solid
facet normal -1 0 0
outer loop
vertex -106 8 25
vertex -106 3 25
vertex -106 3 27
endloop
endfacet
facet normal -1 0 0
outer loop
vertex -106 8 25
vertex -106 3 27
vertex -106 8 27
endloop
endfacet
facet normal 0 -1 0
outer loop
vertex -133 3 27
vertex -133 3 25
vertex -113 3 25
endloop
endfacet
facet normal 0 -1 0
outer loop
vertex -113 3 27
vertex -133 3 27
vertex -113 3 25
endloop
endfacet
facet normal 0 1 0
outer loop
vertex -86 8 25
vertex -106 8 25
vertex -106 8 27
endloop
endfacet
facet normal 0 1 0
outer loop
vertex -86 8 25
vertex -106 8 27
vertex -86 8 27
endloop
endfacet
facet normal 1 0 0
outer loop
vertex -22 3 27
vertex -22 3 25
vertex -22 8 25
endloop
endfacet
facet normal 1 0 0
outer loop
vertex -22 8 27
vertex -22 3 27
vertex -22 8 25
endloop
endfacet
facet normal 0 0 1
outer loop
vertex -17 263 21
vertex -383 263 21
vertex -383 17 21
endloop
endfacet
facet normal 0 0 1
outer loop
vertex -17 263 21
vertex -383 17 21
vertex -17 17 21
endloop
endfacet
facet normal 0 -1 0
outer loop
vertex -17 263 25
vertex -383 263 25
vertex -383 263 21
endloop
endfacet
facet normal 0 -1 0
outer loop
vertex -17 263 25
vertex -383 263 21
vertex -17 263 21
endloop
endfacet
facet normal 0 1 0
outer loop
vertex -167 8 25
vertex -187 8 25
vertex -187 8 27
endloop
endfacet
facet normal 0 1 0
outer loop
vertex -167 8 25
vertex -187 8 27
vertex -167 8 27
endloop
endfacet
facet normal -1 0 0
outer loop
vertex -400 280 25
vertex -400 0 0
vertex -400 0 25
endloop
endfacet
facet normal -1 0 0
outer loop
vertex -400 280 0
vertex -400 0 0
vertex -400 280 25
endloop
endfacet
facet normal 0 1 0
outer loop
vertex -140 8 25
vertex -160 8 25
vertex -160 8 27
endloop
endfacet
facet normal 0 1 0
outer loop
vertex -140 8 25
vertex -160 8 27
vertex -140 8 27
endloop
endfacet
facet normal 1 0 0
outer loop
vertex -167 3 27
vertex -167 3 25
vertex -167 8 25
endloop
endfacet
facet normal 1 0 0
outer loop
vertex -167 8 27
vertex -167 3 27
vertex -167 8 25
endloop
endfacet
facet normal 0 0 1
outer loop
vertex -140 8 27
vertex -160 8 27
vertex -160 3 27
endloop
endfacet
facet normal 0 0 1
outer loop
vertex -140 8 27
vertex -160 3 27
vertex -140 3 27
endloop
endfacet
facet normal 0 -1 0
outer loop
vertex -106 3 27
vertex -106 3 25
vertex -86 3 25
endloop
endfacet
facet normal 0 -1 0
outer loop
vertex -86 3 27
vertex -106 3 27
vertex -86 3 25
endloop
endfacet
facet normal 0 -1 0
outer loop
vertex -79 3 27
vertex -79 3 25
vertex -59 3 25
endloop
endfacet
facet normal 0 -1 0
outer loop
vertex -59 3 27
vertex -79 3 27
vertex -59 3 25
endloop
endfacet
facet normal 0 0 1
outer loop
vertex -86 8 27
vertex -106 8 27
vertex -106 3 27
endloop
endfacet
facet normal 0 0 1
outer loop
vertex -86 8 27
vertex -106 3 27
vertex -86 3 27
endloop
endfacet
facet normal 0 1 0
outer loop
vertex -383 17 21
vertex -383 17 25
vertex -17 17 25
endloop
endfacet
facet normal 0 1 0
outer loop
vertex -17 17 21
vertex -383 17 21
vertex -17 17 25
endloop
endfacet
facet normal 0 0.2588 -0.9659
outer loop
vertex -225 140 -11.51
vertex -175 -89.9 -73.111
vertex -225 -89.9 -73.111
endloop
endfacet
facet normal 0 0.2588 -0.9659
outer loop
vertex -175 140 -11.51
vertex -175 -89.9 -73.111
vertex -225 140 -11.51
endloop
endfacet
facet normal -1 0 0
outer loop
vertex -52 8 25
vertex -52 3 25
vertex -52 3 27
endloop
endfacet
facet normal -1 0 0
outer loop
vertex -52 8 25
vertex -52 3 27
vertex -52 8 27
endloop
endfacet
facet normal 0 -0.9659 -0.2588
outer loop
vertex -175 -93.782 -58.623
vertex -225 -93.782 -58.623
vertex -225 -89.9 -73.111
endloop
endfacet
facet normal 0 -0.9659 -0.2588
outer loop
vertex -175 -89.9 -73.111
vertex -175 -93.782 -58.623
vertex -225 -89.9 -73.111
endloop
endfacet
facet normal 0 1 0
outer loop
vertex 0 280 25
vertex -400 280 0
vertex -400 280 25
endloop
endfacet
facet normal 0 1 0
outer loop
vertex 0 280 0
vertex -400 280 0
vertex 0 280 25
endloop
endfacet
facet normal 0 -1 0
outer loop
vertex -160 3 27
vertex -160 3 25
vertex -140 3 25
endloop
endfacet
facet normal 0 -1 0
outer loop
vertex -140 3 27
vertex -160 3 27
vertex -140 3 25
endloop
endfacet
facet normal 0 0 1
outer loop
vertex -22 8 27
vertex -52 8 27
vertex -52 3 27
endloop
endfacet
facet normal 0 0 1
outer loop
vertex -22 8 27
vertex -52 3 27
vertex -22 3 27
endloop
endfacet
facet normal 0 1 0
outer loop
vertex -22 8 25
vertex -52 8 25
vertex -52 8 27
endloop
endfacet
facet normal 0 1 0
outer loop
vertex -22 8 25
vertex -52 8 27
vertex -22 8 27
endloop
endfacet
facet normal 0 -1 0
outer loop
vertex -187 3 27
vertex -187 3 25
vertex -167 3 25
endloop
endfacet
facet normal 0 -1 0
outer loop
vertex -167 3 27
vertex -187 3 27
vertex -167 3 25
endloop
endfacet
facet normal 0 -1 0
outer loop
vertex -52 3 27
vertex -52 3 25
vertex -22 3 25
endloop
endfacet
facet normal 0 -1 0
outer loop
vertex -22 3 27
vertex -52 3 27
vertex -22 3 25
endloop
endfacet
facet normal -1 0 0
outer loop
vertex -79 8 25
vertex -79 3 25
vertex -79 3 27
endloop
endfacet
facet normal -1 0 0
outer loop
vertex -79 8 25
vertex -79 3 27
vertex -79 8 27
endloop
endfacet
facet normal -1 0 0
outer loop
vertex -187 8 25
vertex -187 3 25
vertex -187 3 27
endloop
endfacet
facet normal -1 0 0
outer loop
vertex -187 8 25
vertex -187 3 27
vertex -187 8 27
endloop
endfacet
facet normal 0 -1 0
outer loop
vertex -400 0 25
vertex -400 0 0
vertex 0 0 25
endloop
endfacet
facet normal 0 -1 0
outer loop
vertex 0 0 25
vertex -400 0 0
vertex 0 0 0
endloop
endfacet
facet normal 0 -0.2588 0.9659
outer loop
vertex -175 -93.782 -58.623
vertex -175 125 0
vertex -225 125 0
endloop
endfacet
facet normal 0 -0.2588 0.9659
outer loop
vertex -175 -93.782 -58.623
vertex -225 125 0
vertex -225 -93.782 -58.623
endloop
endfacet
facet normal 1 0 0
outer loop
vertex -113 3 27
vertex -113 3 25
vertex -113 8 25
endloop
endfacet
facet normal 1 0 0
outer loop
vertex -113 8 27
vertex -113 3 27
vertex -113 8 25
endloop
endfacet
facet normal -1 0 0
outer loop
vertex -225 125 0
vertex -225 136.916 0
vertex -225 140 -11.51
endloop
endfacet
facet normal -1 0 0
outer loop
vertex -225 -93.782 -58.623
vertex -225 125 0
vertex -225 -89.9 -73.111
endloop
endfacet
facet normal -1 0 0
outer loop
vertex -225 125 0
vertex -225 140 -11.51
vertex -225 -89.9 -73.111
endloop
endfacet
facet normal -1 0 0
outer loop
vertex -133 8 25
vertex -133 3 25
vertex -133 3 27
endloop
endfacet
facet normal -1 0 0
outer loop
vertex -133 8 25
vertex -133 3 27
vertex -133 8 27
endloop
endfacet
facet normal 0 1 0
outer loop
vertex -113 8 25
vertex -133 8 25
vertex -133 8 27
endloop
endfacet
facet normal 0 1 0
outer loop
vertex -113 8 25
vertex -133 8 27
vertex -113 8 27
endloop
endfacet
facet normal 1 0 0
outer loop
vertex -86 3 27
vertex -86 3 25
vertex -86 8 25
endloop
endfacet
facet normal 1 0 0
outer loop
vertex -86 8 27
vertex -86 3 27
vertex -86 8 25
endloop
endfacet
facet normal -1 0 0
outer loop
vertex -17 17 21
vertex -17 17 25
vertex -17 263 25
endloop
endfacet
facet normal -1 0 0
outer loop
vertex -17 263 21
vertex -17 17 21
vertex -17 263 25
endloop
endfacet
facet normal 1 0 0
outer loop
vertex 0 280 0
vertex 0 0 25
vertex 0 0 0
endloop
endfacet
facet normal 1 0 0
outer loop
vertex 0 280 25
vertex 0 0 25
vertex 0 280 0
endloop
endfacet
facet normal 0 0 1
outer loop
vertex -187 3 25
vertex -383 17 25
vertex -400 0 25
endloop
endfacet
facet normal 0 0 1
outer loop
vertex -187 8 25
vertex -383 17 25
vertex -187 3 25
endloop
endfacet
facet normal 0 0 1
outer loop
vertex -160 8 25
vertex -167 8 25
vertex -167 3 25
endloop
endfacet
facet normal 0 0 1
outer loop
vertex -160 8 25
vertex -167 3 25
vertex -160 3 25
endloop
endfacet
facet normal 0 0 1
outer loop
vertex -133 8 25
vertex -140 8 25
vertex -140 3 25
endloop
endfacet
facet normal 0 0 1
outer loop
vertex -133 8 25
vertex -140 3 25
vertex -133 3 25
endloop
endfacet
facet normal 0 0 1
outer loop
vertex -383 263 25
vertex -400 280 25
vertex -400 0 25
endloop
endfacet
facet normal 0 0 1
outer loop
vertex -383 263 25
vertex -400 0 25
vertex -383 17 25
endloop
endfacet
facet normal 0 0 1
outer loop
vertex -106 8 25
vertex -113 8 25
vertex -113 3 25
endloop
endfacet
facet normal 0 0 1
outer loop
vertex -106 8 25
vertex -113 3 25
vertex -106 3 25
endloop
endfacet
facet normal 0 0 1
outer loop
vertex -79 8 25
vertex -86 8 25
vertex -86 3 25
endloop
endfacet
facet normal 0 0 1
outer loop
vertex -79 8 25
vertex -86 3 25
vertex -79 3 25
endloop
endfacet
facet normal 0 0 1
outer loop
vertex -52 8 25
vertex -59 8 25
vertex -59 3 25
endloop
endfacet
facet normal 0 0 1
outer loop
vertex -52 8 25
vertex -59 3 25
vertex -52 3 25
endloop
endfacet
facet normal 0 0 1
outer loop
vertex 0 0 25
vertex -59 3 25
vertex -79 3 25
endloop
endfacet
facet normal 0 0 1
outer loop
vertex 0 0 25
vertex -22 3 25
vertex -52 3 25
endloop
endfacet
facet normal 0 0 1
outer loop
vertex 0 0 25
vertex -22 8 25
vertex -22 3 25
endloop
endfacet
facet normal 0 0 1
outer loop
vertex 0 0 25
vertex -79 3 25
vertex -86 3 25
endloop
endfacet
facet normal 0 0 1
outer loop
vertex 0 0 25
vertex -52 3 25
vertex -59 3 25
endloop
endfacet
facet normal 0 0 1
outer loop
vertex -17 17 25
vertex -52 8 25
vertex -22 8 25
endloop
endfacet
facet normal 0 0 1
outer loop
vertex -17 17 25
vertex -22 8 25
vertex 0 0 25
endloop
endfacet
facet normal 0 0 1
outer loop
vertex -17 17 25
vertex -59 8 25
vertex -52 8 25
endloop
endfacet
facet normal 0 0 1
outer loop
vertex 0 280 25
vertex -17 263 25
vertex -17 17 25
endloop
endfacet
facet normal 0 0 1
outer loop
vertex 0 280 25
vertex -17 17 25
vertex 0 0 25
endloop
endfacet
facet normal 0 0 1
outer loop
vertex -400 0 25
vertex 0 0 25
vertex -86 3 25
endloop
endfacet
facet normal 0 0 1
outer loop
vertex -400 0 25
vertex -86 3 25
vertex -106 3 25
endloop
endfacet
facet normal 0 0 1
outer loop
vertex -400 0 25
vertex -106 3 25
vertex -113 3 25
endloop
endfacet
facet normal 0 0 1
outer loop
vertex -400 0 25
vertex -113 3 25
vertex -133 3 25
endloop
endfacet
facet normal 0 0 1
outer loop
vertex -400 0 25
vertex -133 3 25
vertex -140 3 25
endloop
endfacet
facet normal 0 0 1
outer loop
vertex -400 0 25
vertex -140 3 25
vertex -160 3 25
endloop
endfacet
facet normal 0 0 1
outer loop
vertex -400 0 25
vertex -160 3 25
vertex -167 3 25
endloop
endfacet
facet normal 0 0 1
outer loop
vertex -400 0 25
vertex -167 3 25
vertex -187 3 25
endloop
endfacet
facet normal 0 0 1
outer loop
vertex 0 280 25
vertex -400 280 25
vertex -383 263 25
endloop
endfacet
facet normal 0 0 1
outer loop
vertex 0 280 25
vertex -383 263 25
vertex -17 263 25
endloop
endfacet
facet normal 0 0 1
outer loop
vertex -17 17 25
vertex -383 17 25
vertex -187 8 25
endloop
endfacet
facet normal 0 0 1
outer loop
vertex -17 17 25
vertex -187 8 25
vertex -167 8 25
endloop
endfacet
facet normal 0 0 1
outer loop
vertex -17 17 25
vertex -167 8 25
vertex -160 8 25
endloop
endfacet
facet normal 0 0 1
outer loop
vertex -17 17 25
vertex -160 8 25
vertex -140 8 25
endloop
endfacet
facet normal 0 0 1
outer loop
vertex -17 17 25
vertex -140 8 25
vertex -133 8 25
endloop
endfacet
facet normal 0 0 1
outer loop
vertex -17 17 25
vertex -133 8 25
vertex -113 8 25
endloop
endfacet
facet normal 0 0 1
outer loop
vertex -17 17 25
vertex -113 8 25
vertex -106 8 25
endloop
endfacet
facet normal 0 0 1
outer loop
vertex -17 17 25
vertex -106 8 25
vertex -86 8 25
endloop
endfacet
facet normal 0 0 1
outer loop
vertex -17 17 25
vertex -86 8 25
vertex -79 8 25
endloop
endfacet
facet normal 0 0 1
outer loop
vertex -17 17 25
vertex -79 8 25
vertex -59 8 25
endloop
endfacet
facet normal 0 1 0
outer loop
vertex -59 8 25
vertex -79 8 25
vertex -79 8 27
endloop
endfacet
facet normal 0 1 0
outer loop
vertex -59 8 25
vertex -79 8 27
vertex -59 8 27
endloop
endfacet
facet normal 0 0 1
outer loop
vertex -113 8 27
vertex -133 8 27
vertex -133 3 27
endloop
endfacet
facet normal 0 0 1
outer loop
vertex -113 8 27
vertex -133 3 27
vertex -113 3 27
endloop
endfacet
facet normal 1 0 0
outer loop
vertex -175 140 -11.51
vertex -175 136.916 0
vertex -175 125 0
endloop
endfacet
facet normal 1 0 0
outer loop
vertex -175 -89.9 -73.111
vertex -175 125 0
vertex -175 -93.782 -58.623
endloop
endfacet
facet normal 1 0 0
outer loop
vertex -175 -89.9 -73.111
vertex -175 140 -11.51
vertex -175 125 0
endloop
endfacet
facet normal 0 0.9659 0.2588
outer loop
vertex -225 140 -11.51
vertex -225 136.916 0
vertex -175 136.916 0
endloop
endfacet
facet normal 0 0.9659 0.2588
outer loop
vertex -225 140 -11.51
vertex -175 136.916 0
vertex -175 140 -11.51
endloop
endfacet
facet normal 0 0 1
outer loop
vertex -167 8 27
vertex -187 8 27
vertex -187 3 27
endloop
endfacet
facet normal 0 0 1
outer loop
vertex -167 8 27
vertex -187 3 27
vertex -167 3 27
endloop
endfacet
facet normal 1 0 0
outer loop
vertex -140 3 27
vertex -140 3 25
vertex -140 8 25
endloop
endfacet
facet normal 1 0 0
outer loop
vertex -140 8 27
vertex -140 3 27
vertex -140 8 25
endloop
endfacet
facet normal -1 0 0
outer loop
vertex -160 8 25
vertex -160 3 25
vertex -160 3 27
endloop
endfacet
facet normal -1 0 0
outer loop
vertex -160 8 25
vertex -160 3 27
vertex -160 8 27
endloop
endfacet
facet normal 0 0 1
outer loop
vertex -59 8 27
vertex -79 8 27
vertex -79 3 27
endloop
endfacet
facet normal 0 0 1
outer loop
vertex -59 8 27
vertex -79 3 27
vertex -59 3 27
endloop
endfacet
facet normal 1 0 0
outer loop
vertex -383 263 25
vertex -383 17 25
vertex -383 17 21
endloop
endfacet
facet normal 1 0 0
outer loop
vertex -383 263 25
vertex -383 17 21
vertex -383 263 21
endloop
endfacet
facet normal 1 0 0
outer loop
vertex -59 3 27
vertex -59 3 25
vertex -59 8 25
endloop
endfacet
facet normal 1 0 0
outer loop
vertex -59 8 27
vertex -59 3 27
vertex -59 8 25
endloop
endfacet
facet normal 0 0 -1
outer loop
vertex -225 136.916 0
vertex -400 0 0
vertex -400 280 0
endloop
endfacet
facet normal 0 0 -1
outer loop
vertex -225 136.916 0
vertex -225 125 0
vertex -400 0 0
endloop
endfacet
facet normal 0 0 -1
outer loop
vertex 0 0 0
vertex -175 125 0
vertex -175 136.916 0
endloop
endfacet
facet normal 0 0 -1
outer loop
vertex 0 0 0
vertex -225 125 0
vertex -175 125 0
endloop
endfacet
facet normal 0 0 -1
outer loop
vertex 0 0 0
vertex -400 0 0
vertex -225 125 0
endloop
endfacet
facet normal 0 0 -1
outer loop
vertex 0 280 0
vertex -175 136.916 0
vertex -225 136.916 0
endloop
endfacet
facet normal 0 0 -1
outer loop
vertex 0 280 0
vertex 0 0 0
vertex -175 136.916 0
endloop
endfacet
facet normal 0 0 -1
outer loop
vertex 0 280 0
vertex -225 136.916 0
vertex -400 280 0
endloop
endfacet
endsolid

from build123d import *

# Parameters (mm, degrees)
F0_W      = 400
F0_H      = 280
F1_DEPTH  = 25
F2_W      = 366
F2_H      = 246
F3_DEPTH  = 4
F4_W      = 30
F4_H      = 5
F4_W_2    = 20
F5_DEPTH  = 2
F7_DEPTH  = 300
F8_W      = 75
F8_H      = 238.0099048197
F8_W_2    = 175
F9_DEPTH  = 15
F11_DEPTH = 300
F13_DEPTH = 300


with BuildPart() as f1:
    # F0 (on Top) → F1 (new body)
    with BuildSketch(Plane.XY):
        with Locations((-200, 140)):
            Rectangle(F0_W, F0_H)
    extrude(amount=F1_DEPTH)

    # F2 (on face) → F3 (cut)
    with BuildSketch(Plane.XY.offset(25)):
        with Locations((-200, 140)):
            Rectangle(F2_W, F2_H)
    extrude(amount=-F3_DEPTH, mode=Mode.SUBTRACT)

    # F4 (on face) → F5 (join)
    with BuildSketch(Plane.XY.offset(25)):
        with Locations((-37, 5.5)):
            Rectangle(F4_W, F4_H)
        with Locations((-177, 5.5)):
            Rectangle(F4_W_2, F4_H)
        with Locations((-150, 5.5)):
            Rectangle(F4_W_2, F4_H)
        with Locations((-123, 5.5)):
            Rectangle(F4_W_2, F4_H)
        with Locations((-96, 5.5)):
            Rectangle(F4_W_2, F4_H)
        with Locations((-69, 5.5)):
            Rectangle(F4_W_2, F4_H)
    extrude(amount=F5_DEPTH)

    # F6 (on face) → F7 (join)
    with BuildSketch(Plane.YZ):
        Polygon((140, 0), (125, 0), (-93.7821996545, -58.6225137157), (-89.8999139779, -73.1114011101), (140, -11.5099048197), align=None)
    extrude(amount=-F7_DEPTH)

    # F8 (on face) → F9 (cut)
    with BuildSketch(Plane(origin=(0, 12.25569794, -45.7388873943), x_dir=(1, 0, 0), z_dir=(0, 0.2588190451, -0.9659258263))):
        with Locations((-262.5, -13.245680696)):
            Rectangle(F8_W, F8_H)
        with Locations((-87.5, -13.245680696)):
            Rectangle(F8_W_2, F8_H)
    extrude(amount=-F9_DEPTH, mode=Mode.SUBTRACT)

    # F10 (on face) → F11 (cut)
    with BuildSketch(Plane.YZ):
        Polygon((136.9159302986, 0), (140, -11.5099048197), (140, 0), align=None)
    extrude(amount=-F11_DEPTH, mode=Mode.SUBTRACT)

    # F12 (on face) → F13 (join)
    with BuildSketch(Plane.YZ):
        Polygon((136.1177143235, 2.9789825747), (125, 0), (136.9159302986, 0), align=None)
    extrude(amount=-F13_DEPTH)


solid = f1.part
